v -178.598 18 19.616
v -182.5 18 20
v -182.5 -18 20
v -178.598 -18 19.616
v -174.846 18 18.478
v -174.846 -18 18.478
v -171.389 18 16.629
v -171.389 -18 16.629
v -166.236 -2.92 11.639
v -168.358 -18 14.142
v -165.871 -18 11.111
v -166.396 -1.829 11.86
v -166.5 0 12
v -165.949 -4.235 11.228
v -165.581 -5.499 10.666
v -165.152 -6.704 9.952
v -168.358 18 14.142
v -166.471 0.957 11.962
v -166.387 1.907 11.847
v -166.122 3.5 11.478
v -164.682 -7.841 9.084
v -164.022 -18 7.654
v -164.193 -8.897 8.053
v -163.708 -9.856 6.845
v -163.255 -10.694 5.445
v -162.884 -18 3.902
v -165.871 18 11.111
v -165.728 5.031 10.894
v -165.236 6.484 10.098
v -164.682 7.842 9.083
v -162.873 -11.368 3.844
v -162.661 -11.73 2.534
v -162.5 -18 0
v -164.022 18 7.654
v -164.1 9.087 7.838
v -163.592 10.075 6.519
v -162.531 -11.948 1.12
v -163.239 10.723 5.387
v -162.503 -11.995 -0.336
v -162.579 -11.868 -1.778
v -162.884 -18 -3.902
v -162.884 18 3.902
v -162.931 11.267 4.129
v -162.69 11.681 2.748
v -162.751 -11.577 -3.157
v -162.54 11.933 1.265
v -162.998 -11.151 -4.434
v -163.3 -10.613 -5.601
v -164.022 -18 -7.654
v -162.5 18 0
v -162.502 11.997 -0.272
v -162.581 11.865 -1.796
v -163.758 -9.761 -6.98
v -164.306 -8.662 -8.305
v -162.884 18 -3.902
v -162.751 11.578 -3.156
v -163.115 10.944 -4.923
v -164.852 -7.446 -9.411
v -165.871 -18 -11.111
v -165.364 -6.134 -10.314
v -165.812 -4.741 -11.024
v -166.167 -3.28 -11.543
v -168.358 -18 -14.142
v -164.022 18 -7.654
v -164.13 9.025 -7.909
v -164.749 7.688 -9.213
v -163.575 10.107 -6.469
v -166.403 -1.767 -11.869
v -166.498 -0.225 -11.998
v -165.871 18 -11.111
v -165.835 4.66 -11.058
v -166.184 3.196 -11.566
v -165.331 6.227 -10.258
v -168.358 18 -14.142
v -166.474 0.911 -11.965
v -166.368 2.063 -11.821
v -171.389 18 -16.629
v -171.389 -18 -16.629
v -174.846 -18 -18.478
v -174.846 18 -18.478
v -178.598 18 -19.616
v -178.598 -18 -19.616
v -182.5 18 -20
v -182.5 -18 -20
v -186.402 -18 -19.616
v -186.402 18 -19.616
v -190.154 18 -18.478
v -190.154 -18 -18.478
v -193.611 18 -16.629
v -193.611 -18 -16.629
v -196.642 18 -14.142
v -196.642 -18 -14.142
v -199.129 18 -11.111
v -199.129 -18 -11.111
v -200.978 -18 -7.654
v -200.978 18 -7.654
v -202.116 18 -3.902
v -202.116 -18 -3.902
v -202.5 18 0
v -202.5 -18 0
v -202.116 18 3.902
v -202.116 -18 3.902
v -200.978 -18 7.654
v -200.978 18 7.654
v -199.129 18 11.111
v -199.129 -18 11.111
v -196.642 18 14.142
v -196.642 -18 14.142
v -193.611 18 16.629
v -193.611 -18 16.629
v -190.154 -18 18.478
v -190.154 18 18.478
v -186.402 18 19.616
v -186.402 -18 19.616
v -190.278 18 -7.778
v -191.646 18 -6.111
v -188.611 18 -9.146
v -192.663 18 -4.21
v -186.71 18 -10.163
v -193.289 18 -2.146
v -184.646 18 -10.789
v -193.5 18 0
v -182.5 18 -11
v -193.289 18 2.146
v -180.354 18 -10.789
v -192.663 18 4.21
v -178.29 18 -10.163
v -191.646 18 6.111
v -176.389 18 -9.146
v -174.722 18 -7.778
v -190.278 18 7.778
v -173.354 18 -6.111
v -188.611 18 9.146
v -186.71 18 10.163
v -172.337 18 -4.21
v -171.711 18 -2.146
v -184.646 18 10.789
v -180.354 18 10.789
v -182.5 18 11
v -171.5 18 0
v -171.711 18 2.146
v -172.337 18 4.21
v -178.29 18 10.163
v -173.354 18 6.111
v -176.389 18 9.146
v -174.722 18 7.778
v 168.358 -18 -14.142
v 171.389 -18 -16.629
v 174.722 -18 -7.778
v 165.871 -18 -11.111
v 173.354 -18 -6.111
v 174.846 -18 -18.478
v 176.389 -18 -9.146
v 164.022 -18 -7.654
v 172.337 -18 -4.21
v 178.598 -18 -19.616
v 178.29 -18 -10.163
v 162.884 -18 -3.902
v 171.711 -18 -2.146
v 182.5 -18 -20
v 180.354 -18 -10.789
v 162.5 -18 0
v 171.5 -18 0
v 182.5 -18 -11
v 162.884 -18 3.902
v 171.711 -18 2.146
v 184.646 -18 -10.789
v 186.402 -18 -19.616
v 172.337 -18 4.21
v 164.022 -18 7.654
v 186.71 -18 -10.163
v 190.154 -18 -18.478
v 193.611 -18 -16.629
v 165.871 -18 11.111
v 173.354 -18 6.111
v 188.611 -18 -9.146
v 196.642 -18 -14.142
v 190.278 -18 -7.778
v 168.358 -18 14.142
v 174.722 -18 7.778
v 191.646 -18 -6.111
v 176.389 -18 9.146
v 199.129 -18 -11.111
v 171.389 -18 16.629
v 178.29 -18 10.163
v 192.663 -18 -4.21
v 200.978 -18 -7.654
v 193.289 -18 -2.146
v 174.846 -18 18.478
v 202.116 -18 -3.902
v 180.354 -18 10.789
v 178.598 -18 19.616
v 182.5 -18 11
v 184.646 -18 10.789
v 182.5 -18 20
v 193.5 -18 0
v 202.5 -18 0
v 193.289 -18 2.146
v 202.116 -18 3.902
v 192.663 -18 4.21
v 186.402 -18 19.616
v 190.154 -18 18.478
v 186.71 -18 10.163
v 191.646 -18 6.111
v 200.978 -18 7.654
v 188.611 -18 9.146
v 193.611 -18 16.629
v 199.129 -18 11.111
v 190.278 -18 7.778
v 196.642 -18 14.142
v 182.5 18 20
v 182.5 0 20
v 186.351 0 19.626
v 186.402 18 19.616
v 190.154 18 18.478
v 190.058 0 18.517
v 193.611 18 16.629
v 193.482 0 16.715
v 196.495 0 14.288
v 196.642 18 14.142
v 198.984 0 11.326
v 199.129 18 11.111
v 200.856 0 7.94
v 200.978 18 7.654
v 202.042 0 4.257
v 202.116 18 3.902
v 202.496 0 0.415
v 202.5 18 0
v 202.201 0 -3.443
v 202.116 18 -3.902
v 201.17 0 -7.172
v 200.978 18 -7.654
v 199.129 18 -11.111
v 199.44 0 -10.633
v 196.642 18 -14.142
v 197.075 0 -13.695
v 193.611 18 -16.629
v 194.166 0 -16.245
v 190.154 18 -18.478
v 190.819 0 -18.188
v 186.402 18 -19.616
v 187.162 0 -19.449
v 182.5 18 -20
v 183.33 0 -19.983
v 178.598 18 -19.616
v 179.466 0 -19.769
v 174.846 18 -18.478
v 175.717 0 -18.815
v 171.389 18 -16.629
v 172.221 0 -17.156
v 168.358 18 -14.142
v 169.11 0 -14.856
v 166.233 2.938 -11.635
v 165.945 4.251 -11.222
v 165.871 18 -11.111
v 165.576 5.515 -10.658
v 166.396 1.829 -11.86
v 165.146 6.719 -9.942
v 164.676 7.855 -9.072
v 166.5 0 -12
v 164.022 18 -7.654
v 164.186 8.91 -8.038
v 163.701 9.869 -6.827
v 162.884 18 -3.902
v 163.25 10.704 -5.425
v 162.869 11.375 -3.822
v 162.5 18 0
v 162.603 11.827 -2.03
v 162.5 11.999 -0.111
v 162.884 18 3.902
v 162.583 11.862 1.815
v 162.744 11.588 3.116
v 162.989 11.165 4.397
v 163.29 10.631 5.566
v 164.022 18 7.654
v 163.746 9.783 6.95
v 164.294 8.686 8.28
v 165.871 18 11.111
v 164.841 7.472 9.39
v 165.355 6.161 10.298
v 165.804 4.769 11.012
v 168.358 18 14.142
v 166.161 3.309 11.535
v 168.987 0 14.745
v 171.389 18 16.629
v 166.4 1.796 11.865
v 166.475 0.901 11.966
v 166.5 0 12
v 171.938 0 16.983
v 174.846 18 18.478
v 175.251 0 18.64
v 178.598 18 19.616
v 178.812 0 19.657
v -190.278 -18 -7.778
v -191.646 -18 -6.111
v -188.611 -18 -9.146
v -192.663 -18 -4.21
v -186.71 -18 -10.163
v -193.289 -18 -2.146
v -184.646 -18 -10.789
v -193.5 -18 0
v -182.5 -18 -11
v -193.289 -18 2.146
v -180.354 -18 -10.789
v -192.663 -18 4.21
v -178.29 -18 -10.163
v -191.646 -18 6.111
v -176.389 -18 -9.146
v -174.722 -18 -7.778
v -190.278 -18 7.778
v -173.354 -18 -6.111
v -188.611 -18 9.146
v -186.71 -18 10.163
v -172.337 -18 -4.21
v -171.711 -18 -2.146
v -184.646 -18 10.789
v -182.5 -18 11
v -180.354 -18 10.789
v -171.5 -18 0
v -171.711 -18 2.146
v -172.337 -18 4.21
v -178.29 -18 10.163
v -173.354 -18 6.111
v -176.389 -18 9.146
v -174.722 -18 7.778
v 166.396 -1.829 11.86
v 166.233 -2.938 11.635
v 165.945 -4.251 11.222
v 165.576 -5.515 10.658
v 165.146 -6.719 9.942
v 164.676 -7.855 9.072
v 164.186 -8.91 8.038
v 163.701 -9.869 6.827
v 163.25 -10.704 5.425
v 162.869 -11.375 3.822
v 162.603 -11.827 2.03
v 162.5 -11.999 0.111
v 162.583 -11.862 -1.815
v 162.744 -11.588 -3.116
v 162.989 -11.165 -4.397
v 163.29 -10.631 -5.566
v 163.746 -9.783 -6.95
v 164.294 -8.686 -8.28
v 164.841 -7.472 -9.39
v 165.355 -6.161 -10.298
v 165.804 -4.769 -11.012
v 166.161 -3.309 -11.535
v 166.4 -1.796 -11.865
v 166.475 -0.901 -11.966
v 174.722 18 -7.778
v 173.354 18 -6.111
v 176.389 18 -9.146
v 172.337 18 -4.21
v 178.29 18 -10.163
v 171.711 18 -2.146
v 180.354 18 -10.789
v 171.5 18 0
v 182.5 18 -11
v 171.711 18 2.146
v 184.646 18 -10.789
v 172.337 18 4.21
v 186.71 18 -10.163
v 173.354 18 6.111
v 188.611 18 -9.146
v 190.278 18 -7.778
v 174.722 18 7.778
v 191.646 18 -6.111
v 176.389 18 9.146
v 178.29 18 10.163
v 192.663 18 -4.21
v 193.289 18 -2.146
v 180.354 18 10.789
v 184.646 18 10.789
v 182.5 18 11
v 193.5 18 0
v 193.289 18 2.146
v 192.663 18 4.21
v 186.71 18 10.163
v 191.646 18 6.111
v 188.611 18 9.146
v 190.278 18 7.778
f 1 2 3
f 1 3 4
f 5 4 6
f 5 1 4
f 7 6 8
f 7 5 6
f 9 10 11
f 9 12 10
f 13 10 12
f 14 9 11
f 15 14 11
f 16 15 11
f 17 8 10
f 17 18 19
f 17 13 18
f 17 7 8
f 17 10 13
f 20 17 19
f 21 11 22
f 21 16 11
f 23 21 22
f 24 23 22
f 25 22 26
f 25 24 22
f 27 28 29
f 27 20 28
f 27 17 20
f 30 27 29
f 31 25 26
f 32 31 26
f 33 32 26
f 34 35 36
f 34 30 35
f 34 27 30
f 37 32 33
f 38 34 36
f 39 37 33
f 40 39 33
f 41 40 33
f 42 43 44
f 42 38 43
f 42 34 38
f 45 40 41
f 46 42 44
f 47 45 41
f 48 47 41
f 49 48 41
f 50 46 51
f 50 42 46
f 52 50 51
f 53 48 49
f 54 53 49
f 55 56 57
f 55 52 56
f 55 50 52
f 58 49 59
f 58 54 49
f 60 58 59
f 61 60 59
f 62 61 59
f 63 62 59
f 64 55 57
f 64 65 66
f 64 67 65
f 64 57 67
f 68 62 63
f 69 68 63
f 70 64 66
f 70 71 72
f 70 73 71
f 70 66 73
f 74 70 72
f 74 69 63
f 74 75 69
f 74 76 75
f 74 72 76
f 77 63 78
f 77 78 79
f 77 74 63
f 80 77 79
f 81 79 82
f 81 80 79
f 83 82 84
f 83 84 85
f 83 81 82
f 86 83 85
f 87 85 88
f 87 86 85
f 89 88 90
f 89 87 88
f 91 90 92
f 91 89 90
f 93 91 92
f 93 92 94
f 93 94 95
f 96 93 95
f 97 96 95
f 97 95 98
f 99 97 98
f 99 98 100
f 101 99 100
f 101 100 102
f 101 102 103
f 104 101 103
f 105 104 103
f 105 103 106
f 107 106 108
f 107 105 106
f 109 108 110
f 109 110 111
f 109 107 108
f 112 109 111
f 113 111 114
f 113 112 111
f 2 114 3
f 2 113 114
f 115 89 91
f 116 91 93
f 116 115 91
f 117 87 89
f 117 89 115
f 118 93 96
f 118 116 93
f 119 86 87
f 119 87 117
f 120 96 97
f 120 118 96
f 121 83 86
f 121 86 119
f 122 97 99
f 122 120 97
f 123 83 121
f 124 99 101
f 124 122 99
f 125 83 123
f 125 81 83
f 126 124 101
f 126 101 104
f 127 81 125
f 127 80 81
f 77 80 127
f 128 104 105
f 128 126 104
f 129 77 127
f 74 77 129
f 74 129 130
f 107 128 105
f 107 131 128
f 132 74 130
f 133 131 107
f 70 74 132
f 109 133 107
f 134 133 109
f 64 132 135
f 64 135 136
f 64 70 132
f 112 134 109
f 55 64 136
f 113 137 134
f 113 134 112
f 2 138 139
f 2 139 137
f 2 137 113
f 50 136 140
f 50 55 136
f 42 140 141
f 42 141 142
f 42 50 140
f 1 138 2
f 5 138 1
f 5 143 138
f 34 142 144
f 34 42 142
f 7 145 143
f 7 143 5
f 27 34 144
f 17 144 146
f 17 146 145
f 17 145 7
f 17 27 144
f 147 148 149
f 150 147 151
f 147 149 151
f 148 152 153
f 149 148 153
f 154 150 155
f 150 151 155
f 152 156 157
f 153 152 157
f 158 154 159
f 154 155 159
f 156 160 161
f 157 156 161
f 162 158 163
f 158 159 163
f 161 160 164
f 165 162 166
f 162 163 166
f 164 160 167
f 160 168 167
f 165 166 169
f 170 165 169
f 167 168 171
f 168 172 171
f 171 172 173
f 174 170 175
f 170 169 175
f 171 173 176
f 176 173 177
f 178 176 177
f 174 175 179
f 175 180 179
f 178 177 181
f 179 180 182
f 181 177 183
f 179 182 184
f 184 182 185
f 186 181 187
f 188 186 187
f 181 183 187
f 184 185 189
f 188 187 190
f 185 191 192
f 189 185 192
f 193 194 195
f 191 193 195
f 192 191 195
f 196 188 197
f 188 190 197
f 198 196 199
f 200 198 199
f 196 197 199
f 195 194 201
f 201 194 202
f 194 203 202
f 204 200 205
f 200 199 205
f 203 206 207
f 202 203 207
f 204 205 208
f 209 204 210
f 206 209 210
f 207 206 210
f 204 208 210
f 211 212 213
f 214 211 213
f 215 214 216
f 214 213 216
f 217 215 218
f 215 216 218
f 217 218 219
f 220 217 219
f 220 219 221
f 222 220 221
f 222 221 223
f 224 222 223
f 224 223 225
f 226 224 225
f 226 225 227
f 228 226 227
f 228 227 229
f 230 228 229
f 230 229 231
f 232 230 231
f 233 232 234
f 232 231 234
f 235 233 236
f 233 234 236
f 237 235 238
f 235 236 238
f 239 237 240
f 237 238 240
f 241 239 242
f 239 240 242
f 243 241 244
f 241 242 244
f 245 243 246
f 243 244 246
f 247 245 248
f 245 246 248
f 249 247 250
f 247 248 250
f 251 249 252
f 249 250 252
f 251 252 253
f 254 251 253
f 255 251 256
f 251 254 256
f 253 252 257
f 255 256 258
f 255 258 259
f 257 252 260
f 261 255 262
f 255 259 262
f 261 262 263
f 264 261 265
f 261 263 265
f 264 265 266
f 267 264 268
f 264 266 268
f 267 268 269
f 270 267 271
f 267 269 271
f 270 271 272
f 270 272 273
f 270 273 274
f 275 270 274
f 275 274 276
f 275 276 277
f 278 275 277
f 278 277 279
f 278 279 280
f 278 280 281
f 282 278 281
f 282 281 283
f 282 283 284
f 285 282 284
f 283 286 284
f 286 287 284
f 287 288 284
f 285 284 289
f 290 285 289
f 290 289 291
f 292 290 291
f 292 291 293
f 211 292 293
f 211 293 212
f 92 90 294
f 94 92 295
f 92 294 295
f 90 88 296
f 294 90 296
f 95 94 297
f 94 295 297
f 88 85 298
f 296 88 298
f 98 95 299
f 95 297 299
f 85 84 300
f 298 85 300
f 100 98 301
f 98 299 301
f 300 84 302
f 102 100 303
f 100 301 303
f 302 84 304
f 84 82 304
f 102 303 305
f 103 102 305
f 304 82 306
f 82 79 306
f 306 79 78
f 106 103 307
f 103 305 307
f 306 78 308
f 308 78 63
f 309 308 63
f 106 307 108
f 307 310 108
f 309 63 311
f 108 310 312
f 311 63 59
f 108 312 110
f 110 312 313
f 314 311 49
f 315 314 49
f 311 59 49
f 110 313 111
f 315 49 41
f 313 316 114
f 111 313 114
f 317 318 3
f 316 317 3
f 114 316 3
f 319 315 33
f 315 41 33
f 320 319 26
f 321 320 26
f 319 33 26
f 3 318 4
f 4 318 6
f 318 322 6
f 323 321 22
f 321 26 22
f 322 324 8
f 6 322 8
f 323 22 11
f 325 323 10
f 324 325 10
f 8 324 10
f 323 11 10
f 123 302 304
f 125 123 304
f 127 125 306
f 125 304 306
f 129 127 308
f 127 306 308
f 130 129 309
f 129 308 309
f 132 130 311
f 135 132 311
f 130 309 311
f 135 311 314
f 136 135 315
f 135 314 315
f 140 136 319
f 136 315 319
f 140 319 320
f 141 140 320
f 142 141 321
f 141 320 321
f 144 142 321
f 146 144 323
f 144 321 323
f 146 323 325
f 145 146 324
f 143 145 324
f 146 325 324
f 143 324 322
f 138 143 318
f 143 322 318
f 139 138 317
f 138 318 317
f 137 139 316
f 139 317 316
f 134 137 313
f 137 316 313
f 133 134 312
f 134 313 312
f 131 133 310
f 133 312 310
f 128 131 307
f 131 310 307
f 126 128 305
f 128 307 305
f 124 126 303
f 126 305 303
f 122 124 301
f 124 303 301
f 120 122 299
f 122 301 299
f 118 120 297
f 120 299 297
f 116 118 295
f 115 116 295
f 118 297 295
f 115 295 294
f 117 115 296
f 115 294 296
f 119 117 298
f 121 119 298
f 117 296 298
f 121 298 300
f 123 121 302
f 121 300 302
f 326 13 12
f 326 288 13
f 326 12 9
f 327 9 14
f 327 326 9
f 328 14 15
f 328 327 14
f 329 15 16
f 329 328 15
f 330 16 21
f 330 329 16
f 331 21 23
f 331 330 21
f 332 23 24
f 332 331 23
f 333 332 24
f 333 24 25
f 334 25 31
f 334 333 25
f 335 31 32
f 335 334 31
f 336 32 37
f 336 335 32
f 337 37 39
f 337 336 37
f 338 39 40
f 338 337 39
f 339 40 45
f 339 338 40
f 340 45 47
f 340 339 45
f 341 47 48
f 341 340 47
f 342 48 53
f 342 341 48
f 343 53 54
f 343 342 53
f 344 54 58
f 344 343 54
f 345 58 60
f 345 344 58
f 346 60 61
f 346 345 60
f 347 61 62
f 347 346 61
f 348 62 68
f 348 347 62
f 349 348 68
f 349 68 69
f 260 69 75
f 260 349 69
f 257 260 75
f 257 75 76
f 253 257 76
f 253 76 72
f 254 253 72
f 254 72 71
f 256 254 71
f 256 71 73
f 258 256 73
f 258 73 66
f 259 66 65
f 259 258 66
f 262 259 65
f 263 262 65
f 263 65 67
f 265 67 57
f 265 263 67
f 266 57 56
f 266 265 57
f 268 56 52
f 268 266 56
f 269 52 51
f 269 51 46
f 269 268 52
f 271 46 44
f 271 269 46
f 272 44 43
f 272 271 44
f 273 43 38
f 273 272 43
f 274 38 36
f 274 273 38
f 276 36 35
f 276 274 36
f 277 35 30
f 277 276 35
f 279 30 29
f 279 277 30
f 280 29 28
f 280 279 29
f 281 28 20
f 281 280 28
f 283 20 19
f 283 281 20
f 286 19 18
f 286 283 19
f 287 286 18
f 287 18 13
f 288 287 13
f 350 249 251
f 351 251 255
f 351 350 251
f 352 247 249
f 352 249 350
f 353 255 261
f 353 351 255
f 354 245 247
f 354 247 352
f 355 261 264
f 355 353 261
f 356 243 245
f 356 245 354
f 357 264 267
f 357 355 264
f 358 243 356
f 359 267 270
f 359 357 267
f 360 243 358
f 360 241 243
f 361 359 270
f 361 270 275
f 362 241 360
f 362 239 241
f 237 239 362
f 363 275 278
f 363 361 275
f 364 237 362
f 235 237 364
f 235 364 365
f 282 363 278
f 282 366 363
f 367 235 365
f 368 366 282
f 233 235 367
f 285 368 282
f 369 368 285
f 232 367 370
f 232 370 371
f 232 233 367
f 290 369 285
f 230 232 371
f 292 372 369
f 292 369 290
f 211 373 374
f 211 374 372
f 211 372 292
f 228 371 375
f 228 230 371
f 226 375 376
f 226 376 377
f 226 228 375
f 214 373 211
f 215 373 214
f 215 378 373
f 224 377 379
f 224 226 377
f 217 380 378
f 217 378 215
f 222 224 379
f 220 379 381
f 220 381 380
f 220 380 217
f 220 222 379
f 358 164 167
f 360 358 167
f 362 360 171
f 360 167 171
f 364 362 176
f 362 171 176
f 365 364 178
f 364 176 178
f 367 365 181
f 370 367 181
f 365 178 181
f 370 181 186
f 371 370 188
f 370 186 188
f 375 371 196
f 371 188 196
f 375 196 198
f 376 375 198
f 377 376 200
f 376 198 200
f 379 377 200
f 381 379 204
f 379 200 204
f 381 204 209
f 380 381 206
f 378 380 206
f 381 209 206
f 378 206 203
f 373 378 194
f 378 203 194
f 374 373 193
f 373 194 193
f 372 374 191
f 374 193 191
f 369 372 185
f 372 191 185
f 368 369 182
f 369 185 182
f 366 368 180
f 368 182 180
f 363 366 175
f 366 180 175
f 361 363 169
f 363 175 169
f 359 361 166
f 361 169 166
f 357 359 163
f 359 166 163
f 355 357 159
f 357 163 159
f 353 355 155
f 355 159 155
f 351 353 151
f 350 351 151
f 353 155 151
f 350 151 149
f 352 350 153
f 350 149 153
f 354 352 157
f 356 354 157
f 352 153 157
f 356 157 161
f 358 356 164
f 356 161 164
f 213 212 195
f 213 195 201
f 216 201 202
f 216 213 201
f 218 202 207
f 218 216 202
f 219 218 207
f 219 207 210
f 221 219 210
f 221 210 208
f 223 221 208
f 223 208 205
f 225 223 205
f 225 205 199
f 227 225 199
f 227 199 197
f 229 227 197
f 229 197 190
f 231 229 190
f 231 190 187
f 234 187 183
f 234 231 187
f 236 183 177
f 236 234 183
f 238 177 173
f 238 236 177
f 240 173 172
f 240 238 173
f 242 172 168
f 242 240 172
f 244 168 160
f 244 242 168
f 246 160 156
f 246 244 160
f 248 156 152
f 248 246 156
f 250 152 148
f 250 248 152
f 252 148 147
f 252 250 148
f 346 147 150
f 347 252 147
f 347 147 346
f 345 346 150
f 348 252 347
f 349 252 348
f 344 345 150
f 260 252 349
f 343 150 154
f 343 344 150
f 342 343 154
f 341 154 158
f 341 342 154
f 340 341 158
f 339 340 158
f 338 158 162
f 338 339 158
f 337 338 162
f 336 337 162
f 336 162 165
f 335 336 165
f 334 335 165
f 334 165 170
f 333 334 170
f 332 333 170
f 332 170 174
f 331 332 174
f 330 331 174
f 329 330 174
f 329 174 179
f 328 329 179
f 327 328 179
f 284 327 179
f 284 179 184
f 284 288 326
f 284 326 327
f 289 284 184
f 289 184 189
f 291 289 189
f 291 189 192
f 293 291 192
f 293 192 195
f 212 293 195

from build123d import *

# Parameters (mm, degrees)
SKETCH5_R           = 12
BOSS_EXTRUDE3_DEPTH = 182.5
SKETCH2_R           = 20
BOSS_EXTRUDE4_DEPTH = 18
SKETCH6_R           = 11
CUT_EXTRUDE1_DEPTH  = 36


with BuildPart() as part:
    # Sketch5 → Boss-Extrude3 (new, symmetric)
    with BuildSketch(Plane(origin=(0, 0, 0), x_dir=(0, 0, -1), z_dir=(1, 0, 0))):
        with Locations(Location((0, 0, 0), (0, 0, 180))):
            Circle(SKETCH5_R)
    extrude(amount=BOSS_EXTRUDE3_DEPTH, both=True)

    # Sketch2 → Boss-Extrude4 (add, symmetric)
    with BuildSketch(Plane(origin=(0, 0, 0), x_dir=(1, 0, 0), z_dir=(0, 1, 0))):
        with Locations(Location((182.5, 0, 0), (0, 0, 270))):
            Circle(SKETCH2_R)
        with Locations(Location((-182.5, 0, 0), (0, 0, 270))):
            Circle(SKETCH2_R)
    extrude(amount=BOSS_EXTRUDE4_DEPTH, both=True)

    # Sketch6 → Cut-Extrude1 (cut)
    with BuildSketch(Plane.XZ.offset(18)):
        with Locations(Location((182.5, 0, 0), (0, 0, 270))):
            Circle(SKETCH6_R)
        with Locations(Location((-182.5, 0, 0), (0, 0, 270))):
            Circle(SKETCH6_R)
    extrude(amount=-CUT_EXTRUDE1_DEPTH, mode=Mode.SUBTRACT)


solid = part.part
